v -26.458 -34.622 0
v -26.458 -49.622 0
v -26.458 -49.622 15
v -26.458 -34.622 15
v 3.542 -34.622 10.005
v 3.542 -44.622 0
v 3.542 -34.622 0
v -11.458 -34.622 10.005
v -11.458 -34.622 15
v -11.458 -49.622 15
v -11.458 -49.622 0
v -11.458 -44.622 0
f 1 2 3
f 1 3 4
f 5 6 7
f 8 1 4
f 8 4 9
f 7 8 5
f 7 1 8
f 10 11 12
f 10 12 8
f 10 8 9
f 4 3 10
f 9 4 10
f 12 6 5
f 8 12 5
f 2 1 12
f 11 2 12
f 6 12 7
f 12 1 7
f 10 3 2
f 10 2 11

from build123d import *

# Parameters (mm, degrees)
F0_W     = 30
F0_H     = 15
F1_DEPTH = 15
F2_W     = 15
F2_H     = 15
F3_DEPTH = 5
F4_W     = 10
F4_H     = 4.995112
F5_DEPTH = 15
F7_DEPTH = 15


with BuildPart() as f1:
    # F0 (on Top) → F1 (new body)
    with BuildSketch(Plane.XY):
        with Locations((-11.458107, -42.121633)):
            Rectangle(F0_W, F0_H)
    extrude(amount=F1_DEPTH)

    # F2 (on face) → F3 (cut)
    with BuildSketch(Plane.XZ.offset(49.621633)):
        with Locations((-3.958107, 7.5)):
            Rectangle(F2_W, F2_H)
    extrude(amount=-F3_DEPTH, mode=Mode.SUBTRACT)

    # F4 (on face) → F5 (cut)
    with BuildSketch(Plane.YZ.offset(3.541893)):
        with Locations((-39.621633, 12.502444)):
            Rectangle(F4_W, F4_H)
    extrude(amount=-F5_DEPTH, mode=Mode.SUBTRACT)

    # F6 (on face) → F7 (cut)
    with BuildSketch(Plane.YZ.offset(3.541893)):
        Polygon((-44.621633, 10.004888), (-44.621633, 0), (-34.621633, 10.004888), align=None)
    extrude(amount=-F7_DEPTH, mode=Mode.SUBTRACT)


solid = f1.part
